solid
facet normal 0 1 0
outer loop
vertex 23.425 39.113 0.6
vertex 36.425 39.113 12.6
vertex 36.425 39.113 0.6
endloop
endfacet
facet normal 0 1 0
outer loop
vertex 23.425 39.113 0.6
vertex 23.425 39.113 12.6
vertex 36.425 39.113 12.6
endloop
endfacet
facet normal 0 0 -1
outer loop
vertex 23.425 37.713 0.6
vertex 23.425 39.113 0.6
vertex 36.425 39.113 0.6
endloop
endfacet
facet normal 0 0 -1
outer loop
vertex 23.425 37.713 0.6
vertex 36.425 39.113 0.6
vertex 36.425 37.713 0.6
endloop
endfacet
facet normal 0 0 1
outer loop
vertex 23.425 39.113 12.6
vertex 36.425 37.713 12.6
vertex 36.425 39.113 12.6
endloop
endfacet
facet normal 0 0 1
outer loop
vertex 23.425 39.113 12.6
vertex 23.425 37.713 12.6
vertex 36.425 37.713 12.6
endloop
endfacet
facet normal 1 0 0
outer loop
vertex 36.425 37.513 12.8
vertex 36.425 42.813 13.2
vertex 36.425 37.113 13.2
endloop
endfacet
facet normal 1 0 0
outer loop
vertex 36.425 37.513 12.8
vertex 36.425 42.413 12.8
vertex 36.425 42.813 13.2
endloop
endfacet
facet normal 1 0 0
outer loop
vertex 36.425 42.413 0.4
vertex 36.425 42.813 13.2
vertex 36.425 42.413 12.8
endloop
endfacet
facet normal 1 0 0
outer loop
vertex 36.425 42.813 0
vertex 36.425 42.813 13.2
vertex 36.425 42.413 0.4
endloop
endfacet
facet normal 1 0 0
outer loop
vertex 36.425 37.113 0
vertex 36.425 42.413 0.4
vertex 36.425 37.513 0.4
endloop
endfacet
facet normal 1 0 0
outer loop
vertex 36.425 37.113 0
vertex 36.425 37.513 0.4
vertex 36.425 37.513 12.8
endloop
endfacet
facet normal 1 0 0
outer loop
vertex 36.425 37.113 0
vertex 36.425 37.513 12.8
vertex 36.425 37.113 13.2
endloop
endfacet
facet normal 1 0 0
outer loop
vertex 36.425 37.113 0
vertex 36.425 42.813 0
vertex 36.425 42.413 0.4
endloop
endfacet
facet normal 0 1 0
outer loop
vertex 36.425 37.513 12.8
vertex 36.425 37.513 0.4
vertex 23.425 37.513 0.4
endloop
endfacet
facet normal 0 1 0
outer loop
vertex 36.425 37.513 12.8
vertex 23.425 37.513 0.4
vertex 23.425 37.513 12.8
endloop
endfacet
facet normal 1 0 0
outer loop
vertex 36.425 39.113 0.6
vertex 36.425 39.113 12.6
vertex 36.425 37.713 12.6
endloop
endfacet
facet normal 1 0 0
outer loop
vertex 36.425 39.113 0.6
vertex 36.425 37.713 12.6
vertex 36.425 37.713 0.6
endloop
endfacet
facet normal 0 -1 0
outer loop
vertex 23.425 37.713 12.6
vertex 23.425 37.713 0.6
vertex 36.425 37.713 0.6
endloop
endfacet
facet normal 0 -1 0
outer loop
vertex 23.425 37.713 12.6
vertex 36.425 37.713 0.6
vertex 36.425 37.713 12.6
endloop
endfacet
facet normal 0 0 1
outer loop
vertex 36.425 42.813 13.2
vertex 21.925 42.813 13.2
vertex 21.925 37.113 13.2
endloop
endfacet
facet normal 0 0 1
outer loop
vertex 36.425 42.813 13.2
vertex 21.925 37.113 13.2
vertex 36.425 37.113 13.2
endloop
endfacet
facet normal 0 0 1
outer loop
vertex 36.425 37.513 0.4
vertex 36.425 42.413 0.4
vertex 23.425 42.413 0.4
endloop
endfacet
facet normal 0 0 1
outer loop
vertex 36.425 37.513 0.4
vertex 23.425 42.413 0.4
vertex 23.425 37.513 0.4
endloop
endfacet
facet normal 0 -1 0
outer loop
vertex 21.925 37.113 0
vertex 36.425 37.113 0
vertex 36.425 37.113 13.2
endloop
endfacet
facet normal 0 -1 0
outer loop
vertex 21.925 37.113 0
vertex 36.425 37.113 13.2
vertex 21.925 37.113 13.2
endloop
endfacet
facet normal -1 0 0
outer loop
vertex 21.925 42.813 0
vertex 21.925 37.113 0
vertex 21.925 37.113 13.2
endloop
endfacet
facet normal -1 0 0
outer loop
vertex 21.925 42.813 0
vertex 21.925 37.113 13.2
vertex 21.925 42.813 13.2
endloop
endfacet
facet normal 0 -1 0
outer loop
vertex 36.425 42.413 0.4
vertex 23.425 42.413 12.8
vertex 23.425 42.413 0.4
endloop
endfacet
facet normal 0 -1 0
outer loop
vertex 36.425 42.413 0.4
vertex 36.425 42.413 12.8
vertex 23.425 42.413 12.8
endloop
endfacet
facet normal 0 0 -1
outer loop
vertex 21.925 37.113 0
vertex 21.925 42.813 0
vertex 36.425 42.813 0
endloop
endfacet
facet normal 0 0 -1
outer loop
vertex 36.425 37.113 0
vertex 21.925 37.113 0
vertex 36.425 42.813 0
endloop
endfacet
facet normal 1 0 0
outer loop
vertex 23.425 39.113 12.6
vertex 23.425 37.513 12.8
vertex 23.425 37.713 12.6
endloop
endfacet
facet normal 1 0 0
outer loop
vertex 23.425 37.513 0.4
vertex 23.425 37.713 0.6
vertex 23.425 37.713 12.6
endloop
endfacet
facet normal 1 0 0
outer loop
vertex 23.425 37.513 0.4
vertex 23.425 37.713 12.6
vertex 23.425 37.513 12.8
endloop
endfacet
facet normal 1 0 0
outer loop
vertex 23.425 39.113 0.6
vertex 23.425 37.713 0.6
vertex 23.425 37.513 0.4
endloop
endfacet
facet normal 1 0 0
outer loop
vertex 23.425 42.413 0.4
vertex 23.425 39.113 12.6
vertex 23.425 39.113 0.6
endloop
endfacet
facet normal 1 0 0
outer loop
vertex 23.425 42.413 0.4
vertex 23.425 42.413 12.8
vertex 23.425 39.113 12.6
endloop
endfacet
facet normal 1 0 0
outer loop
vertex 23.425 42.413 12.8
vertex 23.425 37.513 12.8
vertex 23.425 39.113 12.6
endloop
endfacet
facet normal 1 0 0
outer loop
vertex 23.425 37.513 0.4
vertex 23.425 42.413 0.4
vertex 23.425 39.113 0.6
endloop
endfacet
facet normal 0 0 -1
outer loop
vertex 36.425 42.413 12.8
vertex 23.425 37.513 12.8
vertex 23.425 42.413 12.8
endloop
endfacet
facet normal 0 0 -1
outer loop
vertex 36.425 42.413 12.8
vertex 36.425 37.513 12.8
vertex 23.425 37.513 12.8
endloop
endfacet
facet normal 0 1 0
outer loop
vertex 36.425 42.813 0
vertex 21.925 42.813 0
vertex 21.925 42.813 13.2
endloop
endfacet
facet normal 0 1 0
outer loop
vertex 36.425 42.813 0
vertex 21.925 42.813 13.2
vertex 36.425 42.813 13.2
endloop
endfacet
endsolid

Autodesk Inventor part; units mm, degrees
ref_plane "YZ Plane" through (0, 0, 0) normal (1, 0, 0) x (0, 1, 0)
ref_plane "XZ Plane" through (0, 0, 0) normal (0, 1, 0) x (-1, 0, 0)
ref_plane "XY Plane" through (0, 0, 0) normal (0, 0, 1) x (1, 0, 0)
ref_plane "Work Plane1" through (0, 0.2202, 0) normal (0, 0, 1) x (1, 0, 0)
sketch "Sketch1" plane through (0, 0.2202, 0) normal (0, 0, 1) x (1, 0, 0)
  line L0 (21.9247, 42.5927) -> (36.4247, 42.5927)
  line L1 (36.4247, 42.5927) -> (36.4247, 36.8927)
  line L2 (36.4247, 36.8927) -> (21.9247, 36.8927)
  line L3 (21.9247, 36.8927) -> (21.9247, 42.5927)
  point P0 (0, -0.2202)
  dimension "d0" = 14.5
  dimension "d2" = 5.7
extrude "Extrusion1" add sketch "Sketch1" along normal blind 13.2
sketch "Sketch2" plane through (36.4247, 37.1129, 0) normal (1, 0, 0) x (0, 0, -1)
  line L0 (0, 5.7) -> (0, 0) projected
  line L1 (0, 5.7) -> (-13.2, 5.7) projected
  line L2 (-13.2, 0) -> (-13.2, 5.7) projected
  line L3 (0, 0) -> (-13.2, 0) projected
  line L4 (-12.8, 5.3) -> (-0.4, 5.3)
  line L5 (-0.4, 5.3) -> (-0.4, 0.4)
  line L6 (-0.4, 0.4) -> (-12.8, 0.4)
  line L7 (-12.8, 0.4) -> (-12.8, 5.3)
  point P0 (0, -37.1129)
  dimension "d5" = 0.4
extrude "Extrusion2" cut sketch "Sketch2" against normal blind 13 contours L4 L5 L6 L7
sketch "Sketch3" plane through (23.4247, 37.1129, 0) normal (1, 0, 0) x (0, 0, -1)
  line L0 (-12.8, 0.4) -> (-12.8, 5.3) projected
  line L1 (-0.4, 0.4) -> (-12.8, 0.4) projected
  line L2 (-0.4, 5.3) -> (-0.4, 0.4) projected
  line L3 (-12.6, 2) -> (-0.6, 2)
  line L4 (-0.6, 2) -> (-0.6, 0.6)
  line L5 (-0.6, 0.6) -> (-12.6, 0.6)
  line L6 (-12.6, 0.6) -> (-12.6, 2)
  point P0 (0, -37.1129)
  dimension "d8" = 0.2
  dimension "d9" = 0.2
  dimension "d10" = 0.2
  dimension "d11" = 1.4
extrude "Extrusion3" add sketch "Sketch3" along normal blind 13
properties part number "nanopc_t4_usb"
